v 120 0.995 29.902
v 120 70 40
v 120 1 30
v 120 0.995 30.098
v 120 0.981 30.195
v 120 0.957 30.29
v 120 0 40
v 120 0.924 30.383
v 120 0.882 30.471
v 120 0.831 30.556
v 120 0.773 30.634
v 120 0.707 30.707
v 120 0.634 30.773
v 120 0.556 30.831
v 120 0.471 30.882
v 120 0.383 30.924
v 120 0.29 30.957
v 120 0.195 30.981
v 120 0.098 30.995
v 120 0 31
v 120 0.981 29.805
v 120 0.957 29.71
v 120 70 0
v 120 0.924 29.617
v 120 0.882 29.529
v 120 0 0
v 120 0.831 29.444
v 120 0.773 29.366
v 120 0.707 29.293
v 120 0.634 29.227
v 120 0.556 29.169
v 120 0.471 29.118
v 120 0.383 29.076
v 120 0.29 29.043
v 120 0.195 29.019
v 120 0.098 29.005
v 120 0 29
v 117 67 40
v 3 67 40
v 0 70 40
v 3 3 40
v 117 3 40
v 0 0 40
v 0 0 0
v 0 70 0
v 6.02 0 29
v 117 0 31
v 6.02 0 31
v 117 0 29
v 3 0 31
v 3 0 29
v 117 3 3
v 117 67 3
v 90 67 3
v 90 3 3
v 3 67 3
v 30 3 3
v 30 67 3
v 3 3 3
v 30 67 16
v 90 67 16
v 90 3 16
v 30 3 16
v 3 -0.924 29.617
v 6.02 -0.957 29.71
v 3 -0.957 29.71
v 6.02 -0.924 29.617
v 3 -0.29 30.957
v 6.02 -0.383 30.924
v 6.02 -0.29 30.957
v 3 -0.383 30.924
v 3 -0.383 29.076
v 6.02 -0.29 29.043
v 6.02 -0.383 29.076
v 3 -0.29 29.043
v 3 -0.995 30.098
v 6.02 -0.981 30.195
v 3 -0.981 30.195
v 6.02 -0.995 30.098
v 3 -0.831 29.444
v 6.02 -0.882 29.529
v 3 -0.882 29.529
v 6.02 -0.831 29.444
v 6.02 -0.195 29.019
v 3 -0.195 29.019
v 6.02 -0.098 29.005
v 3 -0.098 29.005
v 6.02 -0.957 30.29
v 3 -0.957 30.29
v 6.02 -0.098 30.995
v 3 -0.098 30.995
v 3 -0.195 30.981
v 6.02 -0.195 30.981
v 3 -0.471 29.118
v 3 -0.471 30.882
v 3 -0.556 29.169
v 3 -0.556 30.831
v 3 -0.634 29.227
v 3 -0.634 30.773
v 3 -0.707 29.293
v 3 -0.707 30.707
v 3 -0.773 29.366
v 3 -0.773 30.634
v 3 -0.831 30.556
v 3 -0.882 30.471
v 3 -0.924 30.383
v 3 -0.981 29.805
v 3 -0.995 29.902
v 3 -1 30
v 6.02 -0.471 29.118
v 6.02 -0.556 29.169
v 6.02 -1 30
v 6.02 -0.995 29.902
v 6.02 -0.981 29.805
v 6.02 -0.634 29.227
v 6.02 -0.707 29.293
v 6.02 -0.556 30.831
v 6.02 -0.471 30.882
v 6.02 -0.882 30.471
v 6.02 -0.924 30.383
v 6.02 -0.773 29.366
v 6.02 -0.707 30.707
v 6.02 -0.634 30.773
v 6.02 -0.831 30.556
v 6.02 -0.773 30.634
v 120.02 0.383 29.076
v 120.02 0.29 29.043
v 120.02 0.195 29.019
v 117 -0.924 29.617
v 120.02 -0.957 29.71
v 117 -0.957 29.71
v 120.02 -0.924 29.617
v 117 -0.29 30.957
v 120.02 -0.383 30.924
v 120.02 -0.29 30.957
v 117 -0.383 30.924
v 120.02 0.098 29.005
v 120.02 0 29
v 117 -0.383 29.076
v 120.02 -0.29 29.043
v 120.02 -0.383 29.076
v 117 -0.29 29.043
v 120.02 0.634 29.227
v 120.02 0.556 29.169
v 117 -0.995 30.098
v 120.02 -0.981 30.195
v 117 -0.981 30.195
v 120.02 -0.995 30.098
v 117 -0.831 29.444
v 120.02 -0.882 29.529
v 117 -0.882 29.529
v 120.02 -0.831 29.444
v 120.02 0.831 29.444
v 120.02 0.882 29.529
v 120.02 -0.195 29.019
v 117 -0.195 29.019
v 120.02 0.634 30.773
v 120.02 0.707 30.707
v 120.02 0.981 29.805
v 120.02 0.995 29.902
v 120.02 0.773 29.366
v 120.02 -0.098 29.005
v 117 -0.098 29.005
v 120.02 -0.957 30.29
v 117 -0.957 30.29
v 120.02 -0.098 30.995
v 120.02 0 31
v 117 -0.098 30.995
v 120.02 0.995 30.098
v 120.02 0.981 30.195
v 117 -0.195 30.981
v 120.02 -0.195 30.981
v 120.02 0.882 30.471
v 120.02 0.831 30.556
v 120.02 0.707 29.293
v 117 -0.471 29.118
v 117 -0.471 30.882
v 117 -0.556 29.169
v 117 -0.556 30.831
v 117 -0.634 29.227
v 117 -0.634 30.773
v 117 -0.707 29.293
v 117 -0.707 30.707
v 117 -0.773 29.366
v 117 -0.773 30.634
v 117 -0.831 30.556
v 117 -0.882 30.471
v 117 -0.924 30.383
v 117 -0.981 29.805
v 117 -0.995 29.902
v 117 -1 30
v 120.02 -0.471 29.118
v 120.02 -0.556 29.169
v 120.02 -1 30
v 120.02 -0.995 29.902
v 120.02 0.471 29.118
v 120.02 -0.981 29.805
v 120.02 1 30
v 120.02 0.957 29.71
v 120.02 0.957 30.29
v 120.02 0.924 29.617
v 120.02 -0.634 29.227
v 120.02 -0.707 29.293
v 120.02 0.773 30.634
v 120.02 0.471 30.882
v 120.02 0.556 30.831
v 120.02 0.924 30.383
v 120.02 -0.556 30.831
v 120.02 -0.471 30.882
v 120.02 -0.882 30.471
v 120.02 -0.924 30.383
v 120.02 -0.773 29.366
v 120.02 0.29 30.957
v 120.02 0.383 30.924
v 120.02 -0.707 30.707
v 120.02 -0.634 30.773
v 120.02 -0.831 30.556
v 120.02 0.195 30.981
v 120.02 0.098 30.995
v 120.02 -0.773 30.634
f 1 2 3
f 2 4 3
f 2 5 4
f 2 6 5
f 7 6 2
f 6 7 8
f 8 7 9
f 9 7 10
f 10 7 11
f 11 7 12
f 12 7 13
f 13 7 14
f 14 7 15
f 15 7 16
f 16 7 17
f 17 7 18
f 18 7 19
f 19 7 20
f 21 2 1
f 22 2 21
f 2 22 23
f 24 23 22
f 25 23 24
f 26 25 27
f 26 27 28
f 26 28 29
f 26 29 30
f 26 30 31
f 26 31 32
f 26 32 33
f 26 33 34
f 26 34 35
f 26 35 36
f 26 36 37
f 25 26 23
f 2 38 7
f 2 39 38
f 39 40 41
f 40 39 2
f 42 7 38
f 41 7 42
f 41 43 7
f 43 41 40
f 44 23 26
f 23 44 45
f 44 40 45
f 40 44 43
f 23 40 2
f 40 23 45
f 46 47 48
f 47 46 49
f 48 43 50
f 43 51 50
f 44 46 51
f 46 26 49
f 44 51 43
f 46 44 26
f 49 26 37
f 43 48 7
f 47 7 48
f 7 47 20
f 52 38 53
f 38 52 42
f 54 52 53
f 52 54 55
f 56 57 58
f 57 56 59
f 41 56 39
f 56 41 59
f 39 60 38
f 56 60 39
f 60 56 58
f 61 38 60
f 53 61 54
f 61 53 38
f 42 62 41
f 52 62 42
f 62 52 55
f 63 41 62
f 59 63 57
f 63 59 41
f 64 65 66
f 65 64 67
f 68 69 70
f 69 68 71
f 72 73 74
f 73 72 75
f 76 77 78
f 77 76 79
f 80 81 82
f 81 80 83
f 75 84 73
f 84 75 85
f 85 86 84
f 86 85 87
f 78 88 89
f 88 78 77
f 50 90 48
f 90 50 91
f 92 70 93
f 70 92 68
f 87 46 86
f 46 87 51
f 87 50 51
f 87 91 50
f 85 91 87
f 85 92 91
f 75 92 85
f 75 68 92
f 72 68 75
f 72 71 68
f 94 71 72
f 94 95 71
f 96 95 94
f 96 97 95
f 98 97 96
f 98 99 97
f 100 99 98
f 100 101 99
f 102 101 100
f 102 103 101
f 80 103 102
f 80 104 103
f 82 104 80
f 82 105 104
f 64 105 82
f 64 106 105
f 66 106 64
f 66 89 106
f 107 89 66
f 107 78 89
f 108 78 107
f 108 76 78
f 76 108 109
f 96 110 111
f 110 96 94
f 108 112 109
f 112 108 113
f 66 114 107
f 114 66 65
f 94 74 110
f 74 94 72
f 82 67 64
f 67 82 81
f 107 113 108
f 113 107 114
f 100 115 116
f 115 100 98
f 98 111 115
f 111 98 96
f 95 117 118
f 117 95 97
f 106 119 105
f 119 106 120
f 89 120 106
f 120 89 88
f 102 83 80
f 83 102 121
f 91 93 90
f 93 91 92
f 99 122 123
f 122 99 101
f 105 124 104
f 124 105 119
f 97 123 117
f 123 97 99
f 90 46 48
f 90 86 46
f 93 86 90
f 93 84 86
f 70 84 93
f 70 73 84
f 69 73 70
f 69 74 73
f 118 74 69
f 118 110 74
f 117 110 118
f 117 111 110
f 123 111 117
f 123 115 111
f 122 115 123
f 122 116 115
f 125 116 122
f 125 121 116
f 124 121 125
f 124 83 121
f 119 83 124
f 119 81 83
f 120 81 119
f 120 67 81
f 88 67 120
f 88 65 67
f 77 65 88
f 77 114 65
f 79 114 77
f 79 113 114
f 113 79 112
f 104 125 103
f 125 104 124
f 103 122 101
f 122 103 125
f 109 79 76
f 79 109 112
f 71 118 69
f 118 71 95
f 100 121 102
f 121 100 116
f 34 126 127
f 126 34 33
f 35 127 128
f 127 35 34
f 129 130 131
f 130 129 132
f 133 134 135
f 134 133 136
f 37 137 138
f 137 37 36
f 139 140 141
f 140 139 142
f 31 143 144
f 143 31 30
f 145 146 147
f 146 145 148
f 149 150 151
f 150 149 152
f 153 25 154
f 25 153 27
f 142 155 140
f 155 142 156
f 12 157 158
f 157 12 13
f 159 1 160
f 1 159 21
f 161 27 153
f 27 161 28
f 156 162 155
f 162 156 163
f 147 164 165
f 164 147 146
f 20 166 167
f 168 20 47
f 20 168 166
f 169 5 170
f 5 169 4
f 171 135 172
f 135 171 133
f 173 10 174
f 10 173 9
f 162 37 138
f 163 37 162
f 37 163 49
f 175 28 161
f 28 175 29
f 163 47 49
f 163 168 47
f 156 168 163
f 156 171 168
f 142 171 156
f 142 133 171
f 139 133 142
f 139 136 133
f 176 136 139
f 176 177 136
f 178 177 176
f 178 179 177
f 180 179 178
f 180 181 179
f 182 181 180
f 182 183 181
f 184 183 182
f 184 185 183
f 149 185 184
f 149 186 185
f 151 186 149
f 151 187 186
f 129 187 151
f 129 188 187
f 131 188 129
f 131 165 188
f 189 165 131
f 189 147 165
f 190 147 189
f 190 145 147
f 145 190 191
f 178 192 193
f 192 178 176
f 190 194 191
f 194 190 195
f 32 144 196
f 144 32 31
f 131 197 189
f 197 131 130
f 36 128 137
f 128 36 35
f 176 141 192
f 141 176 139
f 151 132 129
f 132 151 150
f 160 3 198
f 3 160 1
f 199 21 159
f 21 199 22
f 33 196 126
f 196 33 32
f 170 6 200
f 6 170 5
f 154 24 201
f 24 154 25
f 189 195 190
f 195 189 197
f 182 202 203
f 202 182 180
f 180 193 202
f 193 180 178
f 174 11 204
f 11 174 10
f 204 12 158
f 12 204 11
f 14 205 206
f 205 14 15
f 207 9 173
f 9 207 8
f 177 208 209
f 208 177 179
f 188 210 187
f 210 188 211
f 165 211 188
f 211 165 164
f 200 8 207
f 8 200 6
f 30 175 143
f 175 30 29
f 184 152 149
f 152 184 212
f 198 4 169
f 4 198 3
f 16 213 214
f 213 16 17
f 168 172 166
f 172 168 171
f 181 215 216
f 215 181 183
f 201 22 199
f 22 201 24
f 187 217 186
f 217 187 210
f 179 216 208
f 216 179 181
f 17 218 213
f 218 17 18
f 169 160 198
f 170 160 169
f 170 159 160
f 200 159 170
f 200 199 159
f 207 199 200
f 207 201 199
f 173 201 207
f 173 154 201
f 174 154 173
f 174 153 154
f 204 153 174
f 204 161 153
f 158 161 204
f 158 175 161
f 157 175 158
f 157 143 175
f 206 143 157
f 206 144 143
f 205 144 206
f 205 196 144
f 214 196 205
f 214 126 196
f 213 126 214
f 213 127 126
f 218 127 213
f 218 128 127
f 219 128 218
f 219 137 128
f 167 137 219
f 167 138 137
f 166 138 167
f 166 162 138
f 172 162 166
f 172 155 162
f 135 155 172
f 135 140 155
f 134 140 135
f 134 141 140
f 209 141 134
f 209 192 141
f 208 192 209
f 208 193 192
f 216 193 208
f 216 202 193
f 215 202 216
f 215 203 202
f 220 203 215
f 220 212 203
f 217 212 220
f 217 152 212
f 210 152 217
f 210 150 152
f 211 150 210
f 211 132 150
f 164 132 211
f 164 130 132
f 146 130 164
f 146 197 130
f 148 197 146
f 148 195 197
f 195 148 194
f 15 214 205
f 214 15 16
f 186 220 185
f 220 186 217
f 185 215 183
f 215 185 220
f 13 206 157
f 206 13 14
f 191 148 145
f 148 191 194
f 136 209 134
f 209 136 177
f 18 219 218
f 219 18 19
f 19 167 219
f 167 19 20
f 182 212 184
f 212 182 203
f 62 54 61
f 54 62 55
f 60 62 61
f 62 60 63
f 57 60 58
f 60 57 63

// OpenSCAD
// Buffer tank for mini horizontal gel-electrophoresis box
// Outer dimensions: 120 mm (X) x 70 mm (Y) x 40 mm (Z)
// Wall thickness: 3 mm, Floor thickness: 3 mm
// Platform: 60 mm long in X (centred), full inner width (Y), top at z = 13 (10 mm above inner floor)
// Electrode holes: 2 mm diameter, horizontal, at y = 0, z = 30, through each end wall

$fn = 64;

// Dimensions
outer_x = 120;
outer_y = 70;
outer_z = 40;
wall_thick = 3;
floor_thick = 3;
platform_height = 13; // z-coordinate of platform top (from base)
hole_z = 30;
hole_d = 2;

// Inner dimensions
inner_x = outer_x - 2 * wall_thick;
inner_y = outer_y - 2 * wall_thick;
inner_z = outer_z - floor_thick;

// Platform dimensions
platform_x = 60;
platform_y = inner_y;
platform_z = platform_height;

// Calculate positions
half_outer_x = outer_x / 2;
half_outer_y = outer_y / 2;

// Main tank shell
module tank_shell() {
    difference() {
        // Outer shell
        cube([outer_x, outer_y, outer_z]);
        
        // Inner cavity (removes interior)
        translate([wall_thick, wall_thick, floor_thick])
            cube([inner_x, inner_y, inner_z]);
    }
}

// Platform (solid raised platform)
module platform() {
    platform_start_x = (outer_x - platform_x) / 2;
    translate([platform_start_x, wall_thick, floor_thick])
        cube([platform_x, inner_y, platform_z]);
}

// Electrode holes - horizontal along X axis
module electrode_holes() {
    // Left hole (through left wall at x = wall_thick)
    // Position: x = wall_thick, y = 0 (left wall), z = hole_z
    translate([wall_thick, 0, hole_z])
        rotate([0, 90, 0])
        cylinder(h = wall_thick + 0.02, r = hole_d / 2);
    
    // Right hole (through right wall at x = outer_x - wall_thick)
    // Position: x = outer_x - wall_thick, y = 0 (left wall), z = hole_z
    translate([outer_x - wall_thick, 0, hole_z])
        rotate([0, 90, 0])
        cylinder(h = wall_thick + 0.02, r = hole_d / 2);
}

// Build the buffer tank
module buffer_tank() {
    union() {
        // Tank shell
        tank_shell();
        
        // Platform
        platform();
        
        // Electrode holes
        electrode_holes();
    }
}

// Final tank
buffer_tank();
